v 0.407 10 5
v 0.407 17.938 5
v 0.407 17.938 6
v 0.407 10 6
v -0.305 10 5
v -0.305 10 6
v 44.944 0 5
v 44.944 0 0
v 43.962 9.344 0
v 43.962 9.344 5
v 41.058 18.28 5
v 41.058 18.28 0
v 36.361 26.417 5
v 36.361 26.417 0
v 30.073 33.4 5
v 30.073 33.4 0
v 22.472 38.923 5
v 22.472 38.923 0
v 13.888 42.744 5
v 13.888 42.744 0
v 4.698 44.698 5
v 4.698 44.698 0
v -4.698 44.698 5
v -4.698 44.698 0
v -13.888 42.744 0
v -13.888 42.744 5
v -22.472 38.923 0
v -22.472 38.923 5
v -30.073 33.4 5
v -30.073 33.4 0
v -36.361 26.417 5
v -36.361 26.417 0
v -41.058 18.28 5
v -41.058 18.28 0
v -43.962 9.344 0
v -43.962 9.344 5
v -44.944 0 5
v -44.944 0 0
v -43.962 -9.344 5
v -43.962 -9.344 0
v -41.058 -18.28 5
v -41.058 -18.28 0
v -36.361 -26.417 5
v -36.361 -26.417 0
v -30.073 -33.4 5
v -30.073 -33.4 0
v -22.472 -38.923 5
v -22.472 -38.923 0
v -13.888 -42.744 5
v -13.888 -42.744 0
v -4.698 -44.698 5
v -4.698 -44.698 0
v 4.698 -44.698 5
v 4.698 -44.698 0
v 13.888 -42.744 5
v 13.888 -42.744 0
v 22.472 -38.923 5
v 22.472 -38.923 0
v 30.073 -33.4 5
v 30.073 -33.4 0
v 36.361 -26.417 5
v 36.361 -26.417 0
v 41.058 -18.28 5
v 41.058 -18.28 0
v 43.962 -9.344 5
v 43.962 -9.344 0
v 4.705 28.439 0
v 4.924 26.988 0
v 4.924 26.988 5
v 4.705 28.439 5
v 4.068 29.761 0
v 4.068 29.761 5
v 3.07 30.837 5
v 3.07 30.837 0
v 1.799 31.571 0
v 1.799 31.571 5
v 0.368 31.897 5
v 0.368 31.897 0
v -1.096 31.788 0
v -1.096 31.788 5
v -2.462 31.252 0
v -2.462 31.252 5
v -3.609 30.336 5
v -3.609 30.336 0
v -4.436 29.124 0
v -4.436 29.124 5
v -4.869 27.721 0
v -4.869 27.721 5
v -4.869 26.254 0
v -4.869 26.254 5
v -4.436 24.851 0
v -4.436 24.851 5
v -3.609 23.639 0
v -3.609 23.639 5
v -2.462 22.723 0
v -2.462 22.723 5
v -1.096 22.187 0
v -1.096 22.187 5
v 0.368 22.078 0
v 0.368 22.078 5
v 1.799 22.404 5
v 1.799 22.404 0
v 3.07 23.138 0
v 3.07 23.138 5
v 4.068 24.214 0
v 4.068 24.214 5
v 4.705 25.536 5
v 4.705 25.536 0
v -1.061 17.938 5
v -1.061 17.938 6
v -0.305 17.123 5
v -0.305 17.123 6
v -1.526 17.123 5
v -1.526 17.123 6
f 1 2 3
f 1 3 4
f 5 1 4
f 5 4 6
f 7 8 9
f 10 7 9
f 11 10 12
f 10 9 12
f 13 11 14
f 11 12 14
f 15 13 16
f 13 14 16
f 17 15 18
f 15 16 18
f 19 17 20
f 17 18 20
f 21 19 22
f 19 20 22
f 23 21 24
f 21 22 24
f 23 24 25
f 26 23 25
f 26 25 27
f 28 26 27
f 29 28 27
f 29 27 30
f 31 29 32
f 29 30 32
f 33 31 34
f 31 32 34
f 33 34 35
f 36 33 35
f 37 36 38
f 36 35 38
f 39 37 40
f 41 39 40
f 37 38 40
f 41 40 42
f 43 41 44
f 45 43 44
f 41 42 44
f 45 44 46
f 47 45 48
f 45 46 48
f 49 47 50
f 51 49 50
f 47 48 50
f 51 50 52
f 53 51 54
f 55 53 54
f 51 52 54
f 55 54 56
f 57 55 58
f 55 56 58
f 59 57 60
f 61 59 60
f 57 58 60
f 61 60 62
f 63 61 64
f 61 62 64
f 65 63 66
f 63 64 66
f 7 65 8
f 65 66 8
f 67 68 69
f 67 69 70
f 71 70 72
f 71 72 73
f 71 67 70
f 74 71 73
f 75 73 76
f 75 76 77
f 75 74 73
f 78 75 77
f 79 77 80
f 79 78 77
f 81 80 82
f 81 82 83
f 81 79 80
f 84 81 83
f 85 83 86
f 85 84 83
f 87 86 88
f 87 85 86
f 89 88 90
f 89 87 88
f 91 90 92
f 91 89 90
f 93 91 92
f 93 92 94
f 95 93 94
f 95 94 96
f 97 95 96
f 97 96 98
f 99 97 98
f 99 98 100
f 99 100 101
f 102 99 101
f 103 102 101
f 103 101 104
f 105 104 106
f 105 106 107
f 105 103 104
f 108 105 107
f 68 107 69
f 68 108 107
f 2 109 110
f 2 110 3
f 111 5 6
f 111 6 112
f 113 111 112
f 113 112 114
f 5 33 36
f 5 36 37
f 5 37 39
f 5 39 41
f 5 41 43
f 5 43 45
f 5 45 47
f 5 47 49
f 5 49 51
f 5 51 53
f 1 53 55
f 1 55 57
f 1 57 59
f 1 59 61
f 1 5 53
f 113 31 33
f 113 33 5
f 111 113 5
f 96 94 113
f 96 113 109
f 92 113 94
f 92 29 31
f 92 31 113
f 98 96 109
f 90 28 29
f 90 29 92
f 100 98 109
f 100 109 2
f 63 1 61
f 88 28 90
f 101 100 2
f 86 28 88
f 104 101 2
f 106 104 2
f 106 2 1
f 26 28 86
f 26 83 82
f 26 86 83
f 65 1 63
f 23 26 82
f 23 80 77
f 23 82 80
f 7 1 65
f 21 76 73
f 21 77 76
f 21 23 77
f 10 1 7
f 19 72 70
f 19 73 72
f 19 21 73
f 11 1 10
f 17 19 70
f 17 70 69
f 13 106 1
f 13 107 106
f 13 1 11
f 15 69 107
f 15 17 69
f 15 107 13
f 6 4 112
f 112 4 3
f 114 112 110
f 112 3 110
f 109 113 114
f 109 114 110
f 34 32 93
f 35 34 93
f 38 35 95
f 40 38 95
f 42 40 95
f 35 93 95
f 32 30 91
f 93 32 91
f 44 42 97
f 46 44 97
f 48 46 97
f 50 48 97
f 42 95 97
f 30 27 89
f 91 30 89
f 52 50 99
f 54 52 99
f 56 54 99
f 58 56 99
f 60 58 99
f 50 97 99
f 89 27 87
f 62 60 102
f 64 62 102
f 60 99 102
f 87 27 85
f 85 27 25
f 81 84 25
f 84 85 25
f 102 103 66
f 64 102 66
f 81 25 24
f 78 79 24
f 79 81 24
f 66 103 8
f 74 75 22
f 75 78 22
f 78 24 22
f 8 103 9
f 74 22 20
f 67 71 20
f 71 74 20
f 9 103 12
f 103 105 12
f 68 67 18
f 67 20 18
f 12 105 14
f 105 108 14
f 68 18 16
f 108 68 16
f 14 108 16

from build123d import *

# Parameters (mm, degrees)
SKIZZE1_R                       = 44.944071705
SKIZZE1_R_2                     = 4.923692712
AUFSATZ_LINEAR_AUSTRAGEN1_DEPTH = 5
AUFSATZ_LINEAR_AUSTRAGEN2_DEPTH = 1


with BuildPart() as part:
    # Skizze1 → Aufsatz-Linear austragen1 (new body)
    with BuildSketch(Plane.XY):
        Circle(SKIZZE1_R)
        with Locations((0, 26.9875)):
            Circle(SKIZZE1_R_2, mode=Mode.SUBTRACT)
    extrude(amount=AUFSATZ_LINEAR_AUSTRAGEN1_DEPTH)

    # Skizze2 → Aufsatz-Linear austragen2 (add)
    with BuildSketch(Plane.XY.offset(5)):
        Polygon((-1.060559395, 17.9375), (0.407051282, 17.9375), (0.407051282, 10), (-0.305288462, 10), (-0.305288462, 17.123397436), (-1.526442308, 17.123397436), align=None)
    extrude(amount=AUFSATZ_LINEAR_AUSTRAGEN2_DEPTH)


solid = part.part
